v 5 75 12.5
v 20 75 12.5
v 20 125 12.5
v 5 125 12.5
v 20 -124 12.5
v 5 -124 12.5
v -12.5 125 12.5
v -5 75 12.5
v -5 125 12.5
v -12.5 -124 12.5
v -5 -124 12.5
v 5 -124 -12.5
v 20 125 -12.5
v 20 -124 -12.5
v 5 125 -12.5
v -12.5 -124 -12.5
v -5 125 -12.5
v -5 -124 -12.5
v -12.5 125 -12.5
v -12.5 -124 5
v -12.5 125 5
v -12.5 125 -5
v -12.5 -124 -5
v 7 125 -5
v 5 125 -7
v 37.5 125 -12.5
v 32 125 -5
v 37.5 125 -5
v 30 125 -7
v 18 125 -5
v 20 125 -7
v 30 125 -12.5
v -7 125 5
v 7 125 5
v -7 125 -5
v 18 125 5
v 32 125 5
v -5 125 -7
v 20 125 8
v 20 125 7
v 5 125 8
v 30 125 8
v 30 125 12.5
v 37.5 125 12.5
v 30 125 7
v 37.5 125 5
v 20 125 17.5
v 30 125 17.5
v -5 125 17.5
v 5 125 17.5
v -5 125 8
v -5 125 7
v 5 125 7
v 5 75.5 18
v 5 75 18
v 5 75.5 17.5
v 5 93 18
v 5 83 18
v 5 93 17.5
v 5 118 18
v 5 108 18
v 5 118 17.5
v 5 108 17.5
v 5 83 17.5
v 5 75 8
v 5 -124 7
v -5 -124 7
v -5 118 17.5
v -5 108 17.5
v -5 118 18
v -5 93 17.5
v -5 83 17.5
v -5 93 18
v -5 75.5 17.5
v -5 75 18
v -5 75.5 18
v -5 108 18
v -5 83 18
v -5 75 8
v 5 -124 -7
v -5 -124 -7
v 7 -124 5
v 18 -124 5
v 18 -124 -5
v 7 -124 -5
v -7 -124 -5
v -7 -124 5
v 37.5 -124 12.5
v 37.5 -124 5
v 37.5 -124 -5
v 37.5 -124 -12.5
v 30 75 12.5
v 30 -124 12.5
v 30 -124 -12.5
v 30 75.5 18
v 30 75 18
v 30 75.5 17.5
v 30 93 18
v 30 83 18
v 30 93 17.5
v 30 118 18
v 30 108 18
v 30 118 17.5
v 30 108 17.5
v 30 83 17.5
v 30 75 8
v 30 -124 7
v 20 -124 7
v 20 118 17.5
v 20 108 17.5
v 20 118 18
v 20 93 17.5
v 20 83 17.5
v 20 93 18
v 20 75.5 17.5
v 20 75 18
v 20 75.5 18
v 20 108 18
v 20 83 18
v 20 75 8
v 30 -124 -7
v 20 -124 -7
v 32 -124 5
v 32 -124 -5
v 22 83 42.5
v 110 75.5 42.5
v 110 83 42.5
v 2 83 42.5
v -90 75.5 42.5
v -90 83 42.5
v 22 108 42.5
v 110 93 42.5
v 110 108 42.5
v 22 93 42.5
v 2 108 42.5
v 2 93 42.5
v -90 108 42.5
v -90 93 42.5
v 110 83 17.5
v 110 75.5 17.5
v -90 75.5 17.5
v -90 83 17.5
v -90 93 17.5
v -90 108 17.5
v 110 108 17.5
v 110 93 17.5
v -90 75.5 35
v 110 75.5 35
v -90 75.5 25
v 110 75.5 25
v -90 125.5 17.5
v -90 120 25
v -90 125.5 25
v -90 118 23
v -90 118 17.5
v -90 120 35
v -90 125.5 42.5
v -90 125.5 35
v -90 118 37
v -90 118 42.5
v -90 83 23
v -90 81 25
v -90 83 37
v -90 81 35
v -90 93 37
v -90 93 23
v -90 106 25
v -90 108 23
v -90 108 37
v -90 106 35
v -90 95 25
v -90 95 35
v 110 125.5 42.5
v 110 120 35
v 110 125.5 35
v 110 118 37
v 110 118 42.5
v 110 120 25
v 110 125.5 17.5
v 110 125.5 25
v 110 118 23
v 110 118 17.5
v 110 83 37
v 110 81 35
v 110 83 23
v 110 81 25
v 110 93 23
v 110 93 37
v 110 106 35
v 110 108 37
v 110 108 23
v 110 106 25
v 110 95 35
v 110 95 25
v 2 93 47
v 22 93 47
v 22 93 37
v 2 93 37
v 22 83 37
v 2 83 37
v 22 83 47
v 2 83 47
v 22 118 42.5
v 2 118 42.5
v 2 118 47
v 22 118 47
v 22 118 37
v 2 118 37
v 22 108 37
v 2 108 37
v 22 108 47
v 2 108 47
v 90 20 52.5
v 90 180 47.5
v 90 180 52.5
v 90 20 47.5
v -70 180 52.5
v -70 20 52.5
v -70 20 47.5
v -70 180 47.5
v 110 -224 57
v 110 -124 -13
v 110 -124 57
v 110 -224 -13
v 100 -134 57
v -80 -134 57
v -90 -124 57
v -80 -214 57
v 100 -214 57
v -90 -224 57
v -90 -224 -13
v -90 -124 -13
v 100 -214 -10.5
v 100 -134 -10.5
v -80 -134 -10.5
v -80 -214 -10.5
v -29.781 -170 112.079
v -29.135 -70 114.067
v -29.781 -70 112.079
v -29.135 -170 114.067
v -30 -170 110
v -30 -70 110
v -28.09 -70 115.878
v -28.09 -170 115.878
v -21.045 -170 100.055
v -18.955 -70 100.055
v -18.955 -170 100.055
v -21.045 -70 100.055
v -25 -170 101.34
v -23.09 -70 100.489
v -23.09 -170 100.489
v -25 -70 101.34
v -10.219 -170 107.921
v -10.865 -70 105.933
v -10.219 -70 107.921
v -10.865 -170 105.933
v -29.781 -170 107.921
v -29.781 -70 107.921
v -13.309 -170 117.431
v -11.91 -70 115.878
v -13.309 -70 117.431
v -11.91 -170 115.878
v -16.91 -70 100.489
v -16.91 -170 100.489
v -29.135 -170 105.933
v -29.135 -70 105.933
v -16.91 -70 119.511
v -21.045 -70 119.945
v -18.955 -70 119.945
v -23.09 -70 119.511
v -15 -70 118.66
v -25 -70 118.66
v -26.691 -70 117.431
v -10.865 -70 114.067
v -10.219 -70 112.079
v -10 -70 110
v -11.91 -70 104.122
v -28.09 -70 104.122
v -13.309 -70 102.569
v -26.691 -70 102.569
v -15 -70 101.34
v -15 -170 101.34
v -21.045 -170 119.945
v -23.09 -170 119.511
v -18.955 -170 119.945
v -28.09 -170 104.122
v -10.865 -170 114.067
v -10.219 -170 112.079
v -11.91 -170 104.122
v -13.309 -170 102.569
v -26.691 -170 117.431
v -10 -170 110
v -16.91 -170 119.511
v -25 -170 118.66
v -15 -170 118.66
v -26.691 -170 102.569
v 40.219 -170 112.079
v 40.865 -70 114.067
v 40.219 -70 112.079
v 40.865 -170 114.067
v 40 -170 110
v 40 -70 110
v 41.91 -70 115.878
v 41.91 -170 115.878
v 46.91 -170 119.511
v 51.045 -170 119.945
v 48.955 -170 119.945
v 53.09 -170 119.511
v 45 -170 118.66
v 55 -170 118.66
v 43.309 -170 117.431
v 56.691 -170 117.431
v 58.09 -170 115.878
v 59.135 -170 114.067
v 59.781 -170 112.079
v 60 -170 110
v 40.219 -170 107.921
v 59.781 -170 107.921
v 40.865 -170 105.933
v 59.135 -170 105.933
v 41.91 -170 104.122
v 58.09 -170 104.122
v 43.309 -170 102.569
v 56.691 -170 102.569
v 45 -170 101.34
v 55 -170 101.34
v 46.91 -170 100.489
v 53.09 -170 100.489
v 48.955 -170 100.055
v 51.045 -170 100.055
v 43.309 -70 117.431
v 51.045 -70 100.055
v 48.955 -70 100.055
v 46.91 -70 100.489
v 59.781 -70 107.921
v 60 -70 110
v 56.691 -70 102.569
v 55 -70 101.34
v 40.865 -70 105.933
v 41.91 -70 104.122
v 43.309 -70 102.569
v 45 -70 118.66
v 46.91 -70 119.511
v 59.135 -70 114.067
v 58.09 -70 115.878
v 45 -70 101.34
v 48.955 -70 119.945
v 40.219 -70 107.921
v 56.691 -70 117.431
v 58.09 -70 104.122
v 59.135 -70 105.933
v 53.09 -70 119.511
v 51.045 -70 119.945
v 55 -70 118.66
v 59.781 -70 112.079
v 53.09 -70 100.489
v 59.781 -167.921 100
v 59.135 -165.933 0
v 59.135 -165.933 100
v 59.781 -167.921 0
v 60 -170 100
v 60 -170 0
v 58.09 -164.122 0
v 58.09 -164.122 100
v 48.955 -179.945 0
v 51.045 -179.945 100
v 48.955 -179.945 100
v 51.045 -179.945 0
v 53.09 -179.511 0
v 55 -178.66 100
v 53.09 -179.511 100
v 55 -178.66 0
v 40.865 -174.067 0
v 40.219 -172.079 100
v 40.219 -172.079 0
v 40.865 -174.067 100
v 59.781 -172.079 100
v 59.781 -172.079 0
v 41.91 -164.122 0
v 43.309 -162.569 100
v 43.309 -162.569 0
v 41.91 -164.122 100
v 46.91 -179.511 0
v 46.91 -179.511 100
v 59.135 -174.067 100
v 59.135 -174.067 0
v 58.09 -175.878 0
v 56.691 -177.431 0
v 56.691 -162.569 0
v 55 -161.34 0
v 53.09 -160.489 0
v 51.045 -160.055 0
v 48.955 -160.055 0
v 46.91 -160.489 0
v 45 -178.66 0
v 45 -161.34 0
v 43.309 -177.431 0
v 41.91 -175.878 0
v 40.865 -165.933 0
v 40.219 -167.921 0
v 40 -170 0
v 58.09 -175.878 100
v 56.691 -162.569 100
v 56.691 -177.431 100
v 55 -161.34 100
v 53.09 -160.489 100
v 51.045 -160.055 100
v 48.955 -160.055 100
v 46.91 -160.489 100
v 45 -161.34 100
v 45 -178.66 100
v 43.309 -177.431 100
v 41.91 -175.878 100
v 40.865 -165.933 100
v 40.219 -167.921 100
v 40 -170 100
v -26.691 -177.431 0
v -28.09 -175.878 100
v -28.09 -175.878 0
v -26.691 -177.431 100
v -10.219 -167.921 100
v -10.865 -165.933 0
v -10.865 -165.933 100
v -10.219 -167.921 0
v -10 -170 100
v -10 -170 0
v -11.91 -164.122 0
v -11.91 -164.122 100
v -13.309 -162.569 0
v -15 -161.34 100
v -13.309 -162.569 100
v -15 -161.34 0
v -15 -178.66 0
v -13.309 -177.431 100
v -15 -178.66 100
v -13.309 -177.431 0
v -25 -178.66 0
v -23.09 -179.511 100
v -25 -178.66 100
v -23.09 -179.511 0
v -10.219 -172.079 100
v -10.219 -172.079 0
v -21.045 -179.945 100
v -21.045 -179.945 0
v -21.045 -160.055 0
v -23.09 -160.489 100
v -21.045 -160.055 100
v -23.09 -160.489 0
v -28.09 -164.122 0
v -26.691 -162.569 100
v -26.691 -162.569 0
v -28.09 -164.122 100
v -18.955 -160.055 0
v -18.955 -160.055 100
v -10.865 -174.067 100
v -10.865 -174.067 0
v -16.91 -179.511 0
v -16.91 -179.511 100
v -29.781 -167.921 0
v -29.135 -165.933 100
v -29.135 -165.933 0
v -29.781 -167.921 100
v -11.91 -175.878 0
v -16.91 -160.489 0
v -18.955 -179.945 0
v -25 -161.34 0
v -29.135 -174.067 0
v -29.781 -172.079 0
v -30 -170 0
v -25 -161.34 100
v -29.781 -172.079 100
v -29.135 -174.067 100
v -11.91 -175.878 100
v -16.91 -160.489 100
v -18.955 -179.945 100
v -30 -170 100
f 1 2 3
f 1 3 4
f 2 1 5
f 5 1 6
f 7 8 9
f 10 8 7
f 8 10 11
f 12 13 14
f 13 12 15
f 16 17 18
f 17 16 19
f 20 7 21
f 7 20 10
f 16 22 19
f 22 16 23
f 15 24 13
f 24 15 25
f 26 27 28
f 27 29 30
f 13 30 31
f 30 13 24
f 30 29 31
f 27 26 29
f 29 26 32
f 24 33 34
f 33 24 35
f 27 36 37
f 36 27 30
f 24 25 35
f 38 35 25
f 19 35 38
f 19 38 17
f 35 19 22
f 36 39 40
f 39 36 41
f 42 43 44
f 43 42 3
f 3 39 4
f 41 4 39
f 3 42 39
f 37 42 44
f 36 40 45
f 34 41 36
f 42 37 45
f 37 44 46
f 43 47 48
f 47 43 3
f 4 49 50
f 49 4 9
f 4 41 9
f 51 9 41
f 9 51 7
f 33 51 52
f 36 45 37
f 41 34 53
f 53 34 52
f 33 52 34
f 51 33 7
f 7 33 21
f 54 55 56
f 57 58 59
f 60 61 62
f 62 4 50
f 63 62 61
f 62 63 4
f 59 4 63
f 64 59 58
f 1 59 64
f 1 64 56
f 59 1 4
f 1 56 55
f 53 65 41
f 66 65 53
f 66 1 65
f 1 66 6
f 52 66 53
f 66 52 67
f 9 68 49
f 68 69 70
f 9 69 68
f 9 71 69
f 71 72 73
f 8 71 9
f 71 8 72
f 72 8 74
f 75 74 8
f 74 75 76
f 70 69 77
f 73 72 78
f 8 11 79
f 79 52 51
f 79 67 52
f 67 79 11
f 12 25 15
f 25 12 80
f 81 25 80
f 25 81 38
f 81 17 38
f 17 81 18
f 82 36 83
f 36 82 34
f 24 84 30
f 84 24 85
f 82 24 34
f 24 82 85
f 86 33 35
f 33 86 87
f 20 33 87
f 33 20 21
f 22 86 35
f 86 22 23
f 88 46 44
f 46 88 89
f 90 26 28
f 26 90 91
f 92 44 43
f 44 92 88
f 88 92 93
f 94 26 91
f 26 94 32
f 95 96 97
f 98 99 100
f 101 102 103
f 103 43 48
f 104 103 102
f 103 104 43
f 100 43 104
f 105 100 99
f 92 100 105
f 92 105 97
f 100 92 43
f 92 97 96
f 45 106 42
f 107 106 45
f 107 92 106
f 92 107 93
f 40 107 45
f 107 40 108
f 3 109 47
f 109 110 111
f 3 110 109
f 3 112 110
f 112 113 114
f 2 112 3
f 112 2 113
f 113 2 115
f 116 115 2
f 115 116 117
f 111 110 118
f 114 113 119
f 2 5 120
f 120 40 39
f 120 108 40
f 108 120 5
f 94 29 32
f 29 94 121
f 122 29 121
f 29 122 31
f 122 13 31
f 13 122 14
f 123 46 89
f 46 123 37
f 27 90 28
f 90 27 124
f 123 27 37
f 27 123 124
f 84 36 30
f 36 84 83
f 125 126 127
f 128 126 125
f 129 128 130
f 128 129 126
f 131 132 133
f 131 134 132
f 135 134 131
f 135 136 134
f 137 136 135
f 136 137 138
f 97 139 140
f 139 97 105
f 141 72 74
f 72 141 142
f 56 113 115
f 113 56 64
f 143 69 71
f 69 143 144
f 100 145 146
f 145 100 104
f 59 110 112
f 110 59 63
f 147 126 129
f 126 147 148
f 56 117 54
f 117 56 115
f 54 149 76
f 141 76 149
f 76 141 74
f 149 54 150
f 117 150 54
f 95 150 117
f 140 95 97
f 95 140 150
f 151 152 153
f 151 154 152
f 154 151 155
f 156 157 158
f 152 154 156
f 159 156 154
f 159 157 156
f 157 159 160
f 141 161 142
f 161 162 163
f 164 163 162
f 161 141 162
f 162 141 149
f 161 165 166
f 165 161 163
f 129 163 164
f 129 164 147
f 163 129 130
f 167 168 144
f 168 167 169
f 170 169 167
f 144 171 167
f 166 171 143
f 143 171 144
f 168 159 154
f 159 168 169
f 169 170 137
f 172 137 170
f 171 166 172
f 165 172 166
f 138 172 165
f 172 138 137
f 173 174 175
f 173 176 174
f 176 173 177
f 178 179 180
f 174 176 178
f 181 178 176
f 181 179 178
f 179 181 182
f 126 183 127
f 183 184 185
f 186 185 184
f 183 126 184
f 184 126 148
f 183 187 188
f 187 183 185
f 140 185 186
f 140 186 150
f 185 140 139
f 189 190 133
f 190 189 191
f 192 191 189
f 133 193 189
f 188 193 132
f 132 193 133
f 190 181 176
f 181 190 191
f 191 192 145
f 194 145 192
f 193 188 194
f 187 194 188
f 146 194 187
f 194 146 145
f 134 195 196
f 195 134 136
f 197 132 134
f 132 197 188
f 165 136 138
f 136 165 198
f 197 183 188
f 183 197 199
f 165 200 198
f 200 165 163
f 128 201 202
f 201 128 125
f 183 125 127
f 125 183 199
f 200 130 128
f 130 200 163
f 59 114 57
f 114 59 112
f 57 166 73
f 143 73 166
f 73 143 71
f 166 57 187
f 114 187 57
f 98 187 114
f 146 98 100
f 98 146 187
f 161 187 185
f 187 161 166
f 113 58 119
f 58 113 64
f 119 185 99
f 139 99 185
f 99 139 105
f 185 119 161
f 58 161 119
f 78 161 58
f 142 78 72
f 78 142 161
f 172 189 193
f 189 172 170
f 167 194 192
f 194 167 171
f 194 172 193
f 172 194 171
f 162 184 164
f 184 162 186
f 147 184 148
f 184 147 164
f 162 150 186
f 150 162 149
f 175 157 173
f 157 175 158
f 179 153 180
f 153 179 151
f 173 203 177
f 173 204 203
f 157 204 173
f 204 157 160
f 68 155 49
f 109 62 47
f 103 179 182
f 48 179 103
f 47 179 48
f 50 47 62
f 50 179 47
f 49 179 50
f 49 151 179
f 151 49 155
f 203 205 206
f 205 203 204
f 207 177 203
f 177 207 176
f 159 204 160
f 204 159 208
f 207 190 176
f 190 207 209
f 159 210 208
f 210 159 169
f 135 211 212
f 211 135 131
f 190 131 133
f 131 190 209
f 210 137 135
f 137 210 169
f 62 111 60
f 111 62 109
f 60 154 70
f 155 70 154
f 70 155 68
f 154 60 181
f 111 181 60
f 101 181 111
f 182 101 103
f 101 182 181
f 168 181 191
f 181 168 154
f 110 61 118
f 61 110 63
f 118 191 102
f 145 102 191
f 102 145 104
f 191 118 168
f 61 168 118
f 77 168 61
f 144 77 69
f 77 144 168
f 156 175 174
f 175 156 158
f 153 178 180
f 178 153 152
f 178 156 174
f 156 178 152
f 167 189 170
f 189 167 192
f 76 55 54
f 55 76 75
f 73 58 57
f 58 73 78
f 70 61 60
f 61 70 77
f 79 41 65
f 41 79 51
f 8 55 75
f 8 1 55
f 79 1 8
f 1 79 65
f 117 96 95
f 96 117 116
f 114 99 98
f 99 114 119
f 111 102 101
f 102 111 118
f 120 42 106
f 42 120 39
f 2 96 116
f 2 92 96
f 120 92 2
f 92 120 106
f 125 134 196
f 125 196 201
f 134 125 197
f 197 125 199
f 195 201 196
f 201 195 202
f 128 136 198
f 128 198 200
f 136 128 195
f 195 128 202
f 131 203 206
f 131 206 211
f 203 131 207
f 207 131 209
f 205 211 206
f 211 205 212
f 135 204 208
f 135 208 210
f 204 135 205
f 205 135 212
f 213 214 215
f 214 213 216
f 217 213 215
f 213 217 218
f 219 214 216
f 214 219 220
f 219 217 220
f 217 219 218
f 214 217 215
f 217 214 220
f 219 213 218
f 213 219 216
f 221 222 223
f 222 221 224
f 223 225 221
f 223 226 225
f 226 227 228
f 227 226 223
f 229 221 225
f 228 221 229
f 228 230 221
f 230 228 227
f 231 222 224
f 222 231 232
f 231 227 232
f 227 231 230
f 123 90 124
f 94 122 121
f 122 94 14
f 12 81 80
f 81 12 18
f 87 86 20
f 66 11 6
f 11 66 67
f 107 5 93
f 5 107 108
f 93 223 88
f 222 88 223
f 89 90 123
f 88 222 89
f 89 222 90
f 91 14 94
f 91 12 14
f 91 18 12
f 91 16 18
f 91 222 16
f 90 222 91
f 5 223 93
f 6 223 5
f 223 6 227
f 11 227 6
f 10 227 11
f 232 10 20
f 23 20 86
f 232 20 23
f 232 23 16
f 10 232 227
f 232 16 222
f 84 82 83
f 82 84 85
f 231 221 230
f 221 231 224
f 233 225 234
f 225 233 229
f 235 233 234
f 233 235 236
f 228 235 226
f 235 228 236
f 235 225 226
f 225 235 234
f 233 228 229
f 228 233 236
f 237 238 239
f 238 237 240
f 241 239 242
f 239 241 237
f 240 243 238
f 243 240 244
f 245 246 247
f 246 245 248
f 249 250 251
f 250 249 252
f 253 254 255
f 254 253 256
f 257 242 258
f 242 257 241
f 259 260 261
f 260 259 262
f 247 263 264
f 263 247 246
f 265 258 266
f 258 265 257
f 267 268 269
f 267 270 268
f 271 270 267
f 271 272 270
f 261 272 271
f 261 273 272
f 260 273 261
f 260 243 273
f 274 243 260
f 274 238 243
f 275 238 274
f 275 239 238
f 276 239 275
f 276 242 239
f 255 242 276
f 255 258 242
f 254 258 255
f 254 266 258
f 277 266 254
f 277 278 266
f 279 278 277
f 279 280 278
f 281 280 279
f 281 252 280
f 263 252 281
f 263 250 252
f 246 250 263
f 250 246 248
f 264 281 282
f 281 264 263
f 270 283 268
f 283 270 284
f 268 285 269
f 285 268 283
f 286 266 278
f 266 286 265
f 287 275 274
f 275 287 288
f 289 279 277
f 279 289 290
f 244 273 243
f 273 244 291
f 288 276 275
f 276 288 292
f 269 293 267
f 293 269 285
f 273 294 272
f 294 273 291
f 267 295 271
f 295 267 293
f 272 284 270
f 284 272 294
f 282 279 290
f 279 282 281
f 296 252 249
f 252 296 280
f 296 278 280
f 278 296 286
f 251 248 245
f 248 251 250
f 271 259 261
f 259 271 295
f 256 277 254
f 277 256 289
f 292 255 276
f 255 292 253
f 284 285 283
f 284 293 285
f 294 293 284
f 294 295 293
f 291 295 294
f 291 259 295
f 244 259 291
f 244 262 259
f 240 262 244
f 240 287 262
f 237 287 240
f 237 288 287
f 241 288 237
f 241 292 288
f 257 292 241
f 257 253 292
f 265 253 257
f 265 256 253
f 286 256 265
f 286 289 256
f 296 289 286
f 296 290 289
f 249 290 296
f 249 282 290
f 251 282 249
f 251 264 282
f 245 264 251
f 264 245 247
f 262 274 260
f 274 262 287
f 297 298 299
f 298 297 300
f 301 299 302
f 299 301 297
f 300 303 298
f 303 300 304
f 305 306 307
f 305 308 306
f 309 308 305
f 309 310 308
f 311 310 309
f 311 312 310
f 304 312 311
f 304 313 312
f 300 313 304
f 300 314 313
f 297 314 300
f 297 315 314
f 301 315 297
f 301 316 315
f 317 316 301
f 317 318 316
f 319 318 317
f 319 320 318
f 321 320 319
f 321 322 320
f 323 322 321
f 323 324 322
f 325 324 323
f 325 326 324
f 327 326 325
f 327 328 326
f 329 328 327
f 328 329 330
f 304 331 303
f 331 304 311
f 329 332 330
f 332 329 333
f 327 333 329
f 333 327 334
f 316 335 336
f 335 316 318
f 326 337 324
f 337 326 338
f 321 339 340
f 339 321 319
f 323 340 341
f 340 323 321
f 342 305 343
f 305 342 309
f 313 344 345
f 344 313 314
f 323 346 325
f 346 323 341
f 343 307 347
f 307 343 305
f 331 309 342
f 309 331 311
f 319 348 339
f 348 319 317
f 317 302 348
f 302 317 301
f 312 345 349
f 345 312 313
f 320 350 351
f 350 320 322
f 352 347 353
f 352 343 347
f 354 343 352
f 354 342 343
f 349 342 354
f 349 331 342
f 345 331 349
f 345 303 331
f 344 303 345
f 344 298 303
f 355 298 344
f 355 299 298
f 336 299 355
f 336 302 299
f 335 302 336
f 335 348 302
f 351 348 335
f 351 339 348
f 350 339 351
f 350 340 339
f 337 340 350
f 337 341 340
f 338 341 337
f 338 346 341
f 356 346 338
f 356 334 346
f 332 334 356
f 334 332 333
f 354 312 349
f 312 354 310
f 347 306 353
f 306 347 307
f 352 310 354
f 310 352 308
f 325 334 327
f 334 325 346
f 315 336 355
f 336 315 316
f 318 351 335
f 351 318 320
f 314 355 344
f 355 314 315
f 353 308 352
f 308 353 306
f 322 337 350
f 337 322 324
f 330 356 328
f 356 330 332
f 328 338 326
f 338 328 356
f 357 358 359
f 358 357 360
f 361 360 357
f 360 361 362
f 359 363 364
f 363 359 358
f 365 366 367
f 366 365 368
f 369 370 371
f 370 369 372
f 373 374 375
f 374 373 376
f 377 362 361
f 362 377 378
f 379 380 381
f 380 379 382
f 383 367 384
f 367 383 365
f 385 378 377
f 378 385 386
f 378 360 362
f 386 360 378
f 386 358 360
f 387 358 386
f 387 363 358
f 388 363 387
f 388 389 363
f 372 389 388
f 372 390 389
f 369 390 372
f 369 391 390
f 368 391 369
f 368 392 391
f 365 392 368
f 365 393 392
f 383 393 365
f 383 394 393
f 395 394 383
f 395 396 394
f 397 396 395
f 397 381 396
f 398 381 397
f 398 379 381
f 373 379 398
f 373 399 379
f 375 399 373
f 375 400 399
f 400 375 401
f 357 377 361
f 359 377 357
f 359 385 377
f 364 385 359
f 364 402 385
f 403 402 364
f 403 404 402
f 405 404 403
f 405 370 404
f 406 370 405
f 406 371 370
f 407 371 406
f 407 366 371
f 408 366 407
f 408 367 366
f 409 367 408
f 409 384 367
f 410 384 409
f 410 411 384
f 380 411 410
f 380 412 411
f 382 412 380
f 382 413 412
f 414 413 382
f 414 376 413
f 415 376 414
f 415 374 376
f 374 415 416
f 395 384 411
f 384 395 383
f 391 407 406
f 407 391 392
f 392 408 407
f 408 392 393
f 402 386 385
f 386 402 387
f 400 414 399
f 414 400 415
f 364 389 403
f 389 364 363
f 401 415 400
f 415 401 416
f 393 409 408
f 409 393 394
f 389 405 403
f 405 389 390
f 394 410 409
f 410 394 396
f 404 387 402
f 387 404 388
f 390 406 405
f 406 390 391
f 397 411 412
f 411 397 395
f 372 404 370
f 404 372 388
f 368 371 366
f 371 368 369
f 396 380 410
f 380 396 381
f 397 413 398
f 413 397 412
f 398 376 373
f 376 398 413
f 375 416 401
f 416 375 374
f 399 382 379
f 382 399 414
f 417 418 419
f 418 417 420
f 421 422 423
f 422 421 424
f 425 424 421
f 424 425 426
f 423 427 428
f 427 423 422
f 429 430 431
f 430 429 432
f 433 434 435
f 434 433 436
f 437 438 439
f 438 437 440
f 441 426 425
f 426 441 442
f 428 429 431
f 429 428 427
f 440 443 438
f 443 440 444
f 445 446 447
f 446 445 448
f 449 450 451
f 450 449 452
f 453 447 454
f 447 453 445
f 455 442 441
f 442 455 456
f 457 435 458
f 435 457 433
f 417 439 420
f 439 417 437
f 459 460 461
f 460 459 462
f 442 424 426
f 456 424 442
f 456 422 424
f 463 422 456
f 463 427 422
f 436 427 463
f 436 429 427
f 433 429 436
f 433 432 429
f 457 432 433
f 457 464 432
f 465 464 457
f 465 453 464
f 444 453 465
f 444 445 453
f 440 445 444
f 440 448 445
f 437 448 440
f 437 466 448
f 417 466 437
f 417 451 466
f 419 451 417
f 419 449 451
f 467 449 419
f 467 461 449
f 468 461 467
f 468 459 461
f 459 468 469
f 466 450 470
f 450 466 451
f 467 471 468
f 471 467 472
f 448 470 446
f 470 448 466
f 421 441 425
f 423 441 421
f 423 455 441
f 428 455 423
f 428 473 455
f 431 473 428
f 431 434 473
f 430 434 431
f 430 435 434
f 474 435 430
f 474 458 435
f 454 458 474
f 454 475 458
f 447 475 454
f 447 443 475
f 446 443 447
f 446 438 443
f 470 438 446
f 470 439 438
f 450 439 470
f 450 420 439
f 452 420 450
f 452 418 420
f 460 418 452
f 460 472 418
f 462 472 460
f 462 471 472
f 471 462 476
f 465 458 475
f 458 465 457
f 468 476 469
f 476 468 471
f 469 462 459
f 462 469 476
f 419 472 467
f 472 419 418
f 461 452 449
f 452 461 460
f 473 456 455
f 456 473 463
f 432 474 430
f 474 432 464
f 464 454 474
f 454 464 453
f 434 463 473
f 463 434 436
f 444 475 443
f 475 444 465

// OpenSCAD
//Постоянные переменные
l=200; //длина рельс
z=25;
t=10;
//Изменяемые переменные
x=00; //перемещение стола по X: -90<x<90
y=100; //перемещение стола по Y: -40<y<100
I=100; //высота положения экструдера
T=100; // длина выезда экструдера
//рельсы 

 difference(){
	cube([z,l+50,z], center=true);
	translate([0,0,t]) cube([10,l+52,6], center=true);
	translate([0,0,-t]) cube([10,l+52,6], center=true);
	translate([t,0,0]) cube([6,l+52,10], center=true);
	translate([-t,0,0]) cube([6,l+52,10], center=true);
}

translate([25,0,0]){
 difference(){
	cube([z,l+50,z], center=true);
	translate([0,0,t]) cube([10,l+52,6], center=true);
	translate([0,0,-t]) cube([10,l+52,6], center=true);
	translate([t,0,0]) cube([6,l+52,10], center=true);
	translate([-t,0,0]) cube([6,l+52,10], center=true);
}//difference
}//translate

//-------
 translate([0,y,0]){//перемещение стола по Y

  rotate([0,0,90]){
   translate([-12,-10,30]){
    difference(){
	cube([z,l,z], center=true);
	translate([0,0,t]) cube([10,l+2,6], center=true);
	translate([0,0,-t]) cube([10,l+2,6], center=true);
	translate([t,0,0]) cube([6,l+2,10], center=true);
	translate([-t,0,0]) cube([6,l+2,10], center=true);
}

translate([25,0,0]){//
 difference(){
	cube([z,l,z], center=true);
	translate([0,0,t]) cube([10,l+2,6], center=true);
	translate([0,0,-t]) cube([10,l+2,6], center=true);
	translate([t,0,0]) cube([6,l+2,10], center=true);
	translate([-t,0,0]) cube([6,l+2,10], center=true);
}//difference
}//translate
}//rotate
}//translate

 color([1,0,0]){
	translate([0,0,13]) cube([10,50,10], center=true);
	translate([25,0,13]) cube([10,50,10], center=true);
}
translate([x,0,0]){//перемещение стола по X
//полозья
 color([0,1,0]){
	translate([t+2,t-22,42]) cube([20,10,10], center=true);
	translate([t+2,t+3,42]) cube([20,10,10], center=true);
}

//стол
	color([0,0,0]) translate([t-0,0,50]) cube([160,160,5], center=true);
}//translate bed
}//translate


difference([]){
	translate([10,-174,22]) cube([200,100,70], center=true);
	translate([10,-174,27	]) cube([180,80,75], center=true);
}

//Extrude
	translate([50,-170,0]) cylinder(I,10,10);
	translate([-20,-170,0]) cylinder(I,10,10);
 rotate([90,0,180]){
	translate([20,I+10,-170]) cylinder(T,10,10);
	translate([-50,I+10,-170]) cylinder(T,10,10);
}
